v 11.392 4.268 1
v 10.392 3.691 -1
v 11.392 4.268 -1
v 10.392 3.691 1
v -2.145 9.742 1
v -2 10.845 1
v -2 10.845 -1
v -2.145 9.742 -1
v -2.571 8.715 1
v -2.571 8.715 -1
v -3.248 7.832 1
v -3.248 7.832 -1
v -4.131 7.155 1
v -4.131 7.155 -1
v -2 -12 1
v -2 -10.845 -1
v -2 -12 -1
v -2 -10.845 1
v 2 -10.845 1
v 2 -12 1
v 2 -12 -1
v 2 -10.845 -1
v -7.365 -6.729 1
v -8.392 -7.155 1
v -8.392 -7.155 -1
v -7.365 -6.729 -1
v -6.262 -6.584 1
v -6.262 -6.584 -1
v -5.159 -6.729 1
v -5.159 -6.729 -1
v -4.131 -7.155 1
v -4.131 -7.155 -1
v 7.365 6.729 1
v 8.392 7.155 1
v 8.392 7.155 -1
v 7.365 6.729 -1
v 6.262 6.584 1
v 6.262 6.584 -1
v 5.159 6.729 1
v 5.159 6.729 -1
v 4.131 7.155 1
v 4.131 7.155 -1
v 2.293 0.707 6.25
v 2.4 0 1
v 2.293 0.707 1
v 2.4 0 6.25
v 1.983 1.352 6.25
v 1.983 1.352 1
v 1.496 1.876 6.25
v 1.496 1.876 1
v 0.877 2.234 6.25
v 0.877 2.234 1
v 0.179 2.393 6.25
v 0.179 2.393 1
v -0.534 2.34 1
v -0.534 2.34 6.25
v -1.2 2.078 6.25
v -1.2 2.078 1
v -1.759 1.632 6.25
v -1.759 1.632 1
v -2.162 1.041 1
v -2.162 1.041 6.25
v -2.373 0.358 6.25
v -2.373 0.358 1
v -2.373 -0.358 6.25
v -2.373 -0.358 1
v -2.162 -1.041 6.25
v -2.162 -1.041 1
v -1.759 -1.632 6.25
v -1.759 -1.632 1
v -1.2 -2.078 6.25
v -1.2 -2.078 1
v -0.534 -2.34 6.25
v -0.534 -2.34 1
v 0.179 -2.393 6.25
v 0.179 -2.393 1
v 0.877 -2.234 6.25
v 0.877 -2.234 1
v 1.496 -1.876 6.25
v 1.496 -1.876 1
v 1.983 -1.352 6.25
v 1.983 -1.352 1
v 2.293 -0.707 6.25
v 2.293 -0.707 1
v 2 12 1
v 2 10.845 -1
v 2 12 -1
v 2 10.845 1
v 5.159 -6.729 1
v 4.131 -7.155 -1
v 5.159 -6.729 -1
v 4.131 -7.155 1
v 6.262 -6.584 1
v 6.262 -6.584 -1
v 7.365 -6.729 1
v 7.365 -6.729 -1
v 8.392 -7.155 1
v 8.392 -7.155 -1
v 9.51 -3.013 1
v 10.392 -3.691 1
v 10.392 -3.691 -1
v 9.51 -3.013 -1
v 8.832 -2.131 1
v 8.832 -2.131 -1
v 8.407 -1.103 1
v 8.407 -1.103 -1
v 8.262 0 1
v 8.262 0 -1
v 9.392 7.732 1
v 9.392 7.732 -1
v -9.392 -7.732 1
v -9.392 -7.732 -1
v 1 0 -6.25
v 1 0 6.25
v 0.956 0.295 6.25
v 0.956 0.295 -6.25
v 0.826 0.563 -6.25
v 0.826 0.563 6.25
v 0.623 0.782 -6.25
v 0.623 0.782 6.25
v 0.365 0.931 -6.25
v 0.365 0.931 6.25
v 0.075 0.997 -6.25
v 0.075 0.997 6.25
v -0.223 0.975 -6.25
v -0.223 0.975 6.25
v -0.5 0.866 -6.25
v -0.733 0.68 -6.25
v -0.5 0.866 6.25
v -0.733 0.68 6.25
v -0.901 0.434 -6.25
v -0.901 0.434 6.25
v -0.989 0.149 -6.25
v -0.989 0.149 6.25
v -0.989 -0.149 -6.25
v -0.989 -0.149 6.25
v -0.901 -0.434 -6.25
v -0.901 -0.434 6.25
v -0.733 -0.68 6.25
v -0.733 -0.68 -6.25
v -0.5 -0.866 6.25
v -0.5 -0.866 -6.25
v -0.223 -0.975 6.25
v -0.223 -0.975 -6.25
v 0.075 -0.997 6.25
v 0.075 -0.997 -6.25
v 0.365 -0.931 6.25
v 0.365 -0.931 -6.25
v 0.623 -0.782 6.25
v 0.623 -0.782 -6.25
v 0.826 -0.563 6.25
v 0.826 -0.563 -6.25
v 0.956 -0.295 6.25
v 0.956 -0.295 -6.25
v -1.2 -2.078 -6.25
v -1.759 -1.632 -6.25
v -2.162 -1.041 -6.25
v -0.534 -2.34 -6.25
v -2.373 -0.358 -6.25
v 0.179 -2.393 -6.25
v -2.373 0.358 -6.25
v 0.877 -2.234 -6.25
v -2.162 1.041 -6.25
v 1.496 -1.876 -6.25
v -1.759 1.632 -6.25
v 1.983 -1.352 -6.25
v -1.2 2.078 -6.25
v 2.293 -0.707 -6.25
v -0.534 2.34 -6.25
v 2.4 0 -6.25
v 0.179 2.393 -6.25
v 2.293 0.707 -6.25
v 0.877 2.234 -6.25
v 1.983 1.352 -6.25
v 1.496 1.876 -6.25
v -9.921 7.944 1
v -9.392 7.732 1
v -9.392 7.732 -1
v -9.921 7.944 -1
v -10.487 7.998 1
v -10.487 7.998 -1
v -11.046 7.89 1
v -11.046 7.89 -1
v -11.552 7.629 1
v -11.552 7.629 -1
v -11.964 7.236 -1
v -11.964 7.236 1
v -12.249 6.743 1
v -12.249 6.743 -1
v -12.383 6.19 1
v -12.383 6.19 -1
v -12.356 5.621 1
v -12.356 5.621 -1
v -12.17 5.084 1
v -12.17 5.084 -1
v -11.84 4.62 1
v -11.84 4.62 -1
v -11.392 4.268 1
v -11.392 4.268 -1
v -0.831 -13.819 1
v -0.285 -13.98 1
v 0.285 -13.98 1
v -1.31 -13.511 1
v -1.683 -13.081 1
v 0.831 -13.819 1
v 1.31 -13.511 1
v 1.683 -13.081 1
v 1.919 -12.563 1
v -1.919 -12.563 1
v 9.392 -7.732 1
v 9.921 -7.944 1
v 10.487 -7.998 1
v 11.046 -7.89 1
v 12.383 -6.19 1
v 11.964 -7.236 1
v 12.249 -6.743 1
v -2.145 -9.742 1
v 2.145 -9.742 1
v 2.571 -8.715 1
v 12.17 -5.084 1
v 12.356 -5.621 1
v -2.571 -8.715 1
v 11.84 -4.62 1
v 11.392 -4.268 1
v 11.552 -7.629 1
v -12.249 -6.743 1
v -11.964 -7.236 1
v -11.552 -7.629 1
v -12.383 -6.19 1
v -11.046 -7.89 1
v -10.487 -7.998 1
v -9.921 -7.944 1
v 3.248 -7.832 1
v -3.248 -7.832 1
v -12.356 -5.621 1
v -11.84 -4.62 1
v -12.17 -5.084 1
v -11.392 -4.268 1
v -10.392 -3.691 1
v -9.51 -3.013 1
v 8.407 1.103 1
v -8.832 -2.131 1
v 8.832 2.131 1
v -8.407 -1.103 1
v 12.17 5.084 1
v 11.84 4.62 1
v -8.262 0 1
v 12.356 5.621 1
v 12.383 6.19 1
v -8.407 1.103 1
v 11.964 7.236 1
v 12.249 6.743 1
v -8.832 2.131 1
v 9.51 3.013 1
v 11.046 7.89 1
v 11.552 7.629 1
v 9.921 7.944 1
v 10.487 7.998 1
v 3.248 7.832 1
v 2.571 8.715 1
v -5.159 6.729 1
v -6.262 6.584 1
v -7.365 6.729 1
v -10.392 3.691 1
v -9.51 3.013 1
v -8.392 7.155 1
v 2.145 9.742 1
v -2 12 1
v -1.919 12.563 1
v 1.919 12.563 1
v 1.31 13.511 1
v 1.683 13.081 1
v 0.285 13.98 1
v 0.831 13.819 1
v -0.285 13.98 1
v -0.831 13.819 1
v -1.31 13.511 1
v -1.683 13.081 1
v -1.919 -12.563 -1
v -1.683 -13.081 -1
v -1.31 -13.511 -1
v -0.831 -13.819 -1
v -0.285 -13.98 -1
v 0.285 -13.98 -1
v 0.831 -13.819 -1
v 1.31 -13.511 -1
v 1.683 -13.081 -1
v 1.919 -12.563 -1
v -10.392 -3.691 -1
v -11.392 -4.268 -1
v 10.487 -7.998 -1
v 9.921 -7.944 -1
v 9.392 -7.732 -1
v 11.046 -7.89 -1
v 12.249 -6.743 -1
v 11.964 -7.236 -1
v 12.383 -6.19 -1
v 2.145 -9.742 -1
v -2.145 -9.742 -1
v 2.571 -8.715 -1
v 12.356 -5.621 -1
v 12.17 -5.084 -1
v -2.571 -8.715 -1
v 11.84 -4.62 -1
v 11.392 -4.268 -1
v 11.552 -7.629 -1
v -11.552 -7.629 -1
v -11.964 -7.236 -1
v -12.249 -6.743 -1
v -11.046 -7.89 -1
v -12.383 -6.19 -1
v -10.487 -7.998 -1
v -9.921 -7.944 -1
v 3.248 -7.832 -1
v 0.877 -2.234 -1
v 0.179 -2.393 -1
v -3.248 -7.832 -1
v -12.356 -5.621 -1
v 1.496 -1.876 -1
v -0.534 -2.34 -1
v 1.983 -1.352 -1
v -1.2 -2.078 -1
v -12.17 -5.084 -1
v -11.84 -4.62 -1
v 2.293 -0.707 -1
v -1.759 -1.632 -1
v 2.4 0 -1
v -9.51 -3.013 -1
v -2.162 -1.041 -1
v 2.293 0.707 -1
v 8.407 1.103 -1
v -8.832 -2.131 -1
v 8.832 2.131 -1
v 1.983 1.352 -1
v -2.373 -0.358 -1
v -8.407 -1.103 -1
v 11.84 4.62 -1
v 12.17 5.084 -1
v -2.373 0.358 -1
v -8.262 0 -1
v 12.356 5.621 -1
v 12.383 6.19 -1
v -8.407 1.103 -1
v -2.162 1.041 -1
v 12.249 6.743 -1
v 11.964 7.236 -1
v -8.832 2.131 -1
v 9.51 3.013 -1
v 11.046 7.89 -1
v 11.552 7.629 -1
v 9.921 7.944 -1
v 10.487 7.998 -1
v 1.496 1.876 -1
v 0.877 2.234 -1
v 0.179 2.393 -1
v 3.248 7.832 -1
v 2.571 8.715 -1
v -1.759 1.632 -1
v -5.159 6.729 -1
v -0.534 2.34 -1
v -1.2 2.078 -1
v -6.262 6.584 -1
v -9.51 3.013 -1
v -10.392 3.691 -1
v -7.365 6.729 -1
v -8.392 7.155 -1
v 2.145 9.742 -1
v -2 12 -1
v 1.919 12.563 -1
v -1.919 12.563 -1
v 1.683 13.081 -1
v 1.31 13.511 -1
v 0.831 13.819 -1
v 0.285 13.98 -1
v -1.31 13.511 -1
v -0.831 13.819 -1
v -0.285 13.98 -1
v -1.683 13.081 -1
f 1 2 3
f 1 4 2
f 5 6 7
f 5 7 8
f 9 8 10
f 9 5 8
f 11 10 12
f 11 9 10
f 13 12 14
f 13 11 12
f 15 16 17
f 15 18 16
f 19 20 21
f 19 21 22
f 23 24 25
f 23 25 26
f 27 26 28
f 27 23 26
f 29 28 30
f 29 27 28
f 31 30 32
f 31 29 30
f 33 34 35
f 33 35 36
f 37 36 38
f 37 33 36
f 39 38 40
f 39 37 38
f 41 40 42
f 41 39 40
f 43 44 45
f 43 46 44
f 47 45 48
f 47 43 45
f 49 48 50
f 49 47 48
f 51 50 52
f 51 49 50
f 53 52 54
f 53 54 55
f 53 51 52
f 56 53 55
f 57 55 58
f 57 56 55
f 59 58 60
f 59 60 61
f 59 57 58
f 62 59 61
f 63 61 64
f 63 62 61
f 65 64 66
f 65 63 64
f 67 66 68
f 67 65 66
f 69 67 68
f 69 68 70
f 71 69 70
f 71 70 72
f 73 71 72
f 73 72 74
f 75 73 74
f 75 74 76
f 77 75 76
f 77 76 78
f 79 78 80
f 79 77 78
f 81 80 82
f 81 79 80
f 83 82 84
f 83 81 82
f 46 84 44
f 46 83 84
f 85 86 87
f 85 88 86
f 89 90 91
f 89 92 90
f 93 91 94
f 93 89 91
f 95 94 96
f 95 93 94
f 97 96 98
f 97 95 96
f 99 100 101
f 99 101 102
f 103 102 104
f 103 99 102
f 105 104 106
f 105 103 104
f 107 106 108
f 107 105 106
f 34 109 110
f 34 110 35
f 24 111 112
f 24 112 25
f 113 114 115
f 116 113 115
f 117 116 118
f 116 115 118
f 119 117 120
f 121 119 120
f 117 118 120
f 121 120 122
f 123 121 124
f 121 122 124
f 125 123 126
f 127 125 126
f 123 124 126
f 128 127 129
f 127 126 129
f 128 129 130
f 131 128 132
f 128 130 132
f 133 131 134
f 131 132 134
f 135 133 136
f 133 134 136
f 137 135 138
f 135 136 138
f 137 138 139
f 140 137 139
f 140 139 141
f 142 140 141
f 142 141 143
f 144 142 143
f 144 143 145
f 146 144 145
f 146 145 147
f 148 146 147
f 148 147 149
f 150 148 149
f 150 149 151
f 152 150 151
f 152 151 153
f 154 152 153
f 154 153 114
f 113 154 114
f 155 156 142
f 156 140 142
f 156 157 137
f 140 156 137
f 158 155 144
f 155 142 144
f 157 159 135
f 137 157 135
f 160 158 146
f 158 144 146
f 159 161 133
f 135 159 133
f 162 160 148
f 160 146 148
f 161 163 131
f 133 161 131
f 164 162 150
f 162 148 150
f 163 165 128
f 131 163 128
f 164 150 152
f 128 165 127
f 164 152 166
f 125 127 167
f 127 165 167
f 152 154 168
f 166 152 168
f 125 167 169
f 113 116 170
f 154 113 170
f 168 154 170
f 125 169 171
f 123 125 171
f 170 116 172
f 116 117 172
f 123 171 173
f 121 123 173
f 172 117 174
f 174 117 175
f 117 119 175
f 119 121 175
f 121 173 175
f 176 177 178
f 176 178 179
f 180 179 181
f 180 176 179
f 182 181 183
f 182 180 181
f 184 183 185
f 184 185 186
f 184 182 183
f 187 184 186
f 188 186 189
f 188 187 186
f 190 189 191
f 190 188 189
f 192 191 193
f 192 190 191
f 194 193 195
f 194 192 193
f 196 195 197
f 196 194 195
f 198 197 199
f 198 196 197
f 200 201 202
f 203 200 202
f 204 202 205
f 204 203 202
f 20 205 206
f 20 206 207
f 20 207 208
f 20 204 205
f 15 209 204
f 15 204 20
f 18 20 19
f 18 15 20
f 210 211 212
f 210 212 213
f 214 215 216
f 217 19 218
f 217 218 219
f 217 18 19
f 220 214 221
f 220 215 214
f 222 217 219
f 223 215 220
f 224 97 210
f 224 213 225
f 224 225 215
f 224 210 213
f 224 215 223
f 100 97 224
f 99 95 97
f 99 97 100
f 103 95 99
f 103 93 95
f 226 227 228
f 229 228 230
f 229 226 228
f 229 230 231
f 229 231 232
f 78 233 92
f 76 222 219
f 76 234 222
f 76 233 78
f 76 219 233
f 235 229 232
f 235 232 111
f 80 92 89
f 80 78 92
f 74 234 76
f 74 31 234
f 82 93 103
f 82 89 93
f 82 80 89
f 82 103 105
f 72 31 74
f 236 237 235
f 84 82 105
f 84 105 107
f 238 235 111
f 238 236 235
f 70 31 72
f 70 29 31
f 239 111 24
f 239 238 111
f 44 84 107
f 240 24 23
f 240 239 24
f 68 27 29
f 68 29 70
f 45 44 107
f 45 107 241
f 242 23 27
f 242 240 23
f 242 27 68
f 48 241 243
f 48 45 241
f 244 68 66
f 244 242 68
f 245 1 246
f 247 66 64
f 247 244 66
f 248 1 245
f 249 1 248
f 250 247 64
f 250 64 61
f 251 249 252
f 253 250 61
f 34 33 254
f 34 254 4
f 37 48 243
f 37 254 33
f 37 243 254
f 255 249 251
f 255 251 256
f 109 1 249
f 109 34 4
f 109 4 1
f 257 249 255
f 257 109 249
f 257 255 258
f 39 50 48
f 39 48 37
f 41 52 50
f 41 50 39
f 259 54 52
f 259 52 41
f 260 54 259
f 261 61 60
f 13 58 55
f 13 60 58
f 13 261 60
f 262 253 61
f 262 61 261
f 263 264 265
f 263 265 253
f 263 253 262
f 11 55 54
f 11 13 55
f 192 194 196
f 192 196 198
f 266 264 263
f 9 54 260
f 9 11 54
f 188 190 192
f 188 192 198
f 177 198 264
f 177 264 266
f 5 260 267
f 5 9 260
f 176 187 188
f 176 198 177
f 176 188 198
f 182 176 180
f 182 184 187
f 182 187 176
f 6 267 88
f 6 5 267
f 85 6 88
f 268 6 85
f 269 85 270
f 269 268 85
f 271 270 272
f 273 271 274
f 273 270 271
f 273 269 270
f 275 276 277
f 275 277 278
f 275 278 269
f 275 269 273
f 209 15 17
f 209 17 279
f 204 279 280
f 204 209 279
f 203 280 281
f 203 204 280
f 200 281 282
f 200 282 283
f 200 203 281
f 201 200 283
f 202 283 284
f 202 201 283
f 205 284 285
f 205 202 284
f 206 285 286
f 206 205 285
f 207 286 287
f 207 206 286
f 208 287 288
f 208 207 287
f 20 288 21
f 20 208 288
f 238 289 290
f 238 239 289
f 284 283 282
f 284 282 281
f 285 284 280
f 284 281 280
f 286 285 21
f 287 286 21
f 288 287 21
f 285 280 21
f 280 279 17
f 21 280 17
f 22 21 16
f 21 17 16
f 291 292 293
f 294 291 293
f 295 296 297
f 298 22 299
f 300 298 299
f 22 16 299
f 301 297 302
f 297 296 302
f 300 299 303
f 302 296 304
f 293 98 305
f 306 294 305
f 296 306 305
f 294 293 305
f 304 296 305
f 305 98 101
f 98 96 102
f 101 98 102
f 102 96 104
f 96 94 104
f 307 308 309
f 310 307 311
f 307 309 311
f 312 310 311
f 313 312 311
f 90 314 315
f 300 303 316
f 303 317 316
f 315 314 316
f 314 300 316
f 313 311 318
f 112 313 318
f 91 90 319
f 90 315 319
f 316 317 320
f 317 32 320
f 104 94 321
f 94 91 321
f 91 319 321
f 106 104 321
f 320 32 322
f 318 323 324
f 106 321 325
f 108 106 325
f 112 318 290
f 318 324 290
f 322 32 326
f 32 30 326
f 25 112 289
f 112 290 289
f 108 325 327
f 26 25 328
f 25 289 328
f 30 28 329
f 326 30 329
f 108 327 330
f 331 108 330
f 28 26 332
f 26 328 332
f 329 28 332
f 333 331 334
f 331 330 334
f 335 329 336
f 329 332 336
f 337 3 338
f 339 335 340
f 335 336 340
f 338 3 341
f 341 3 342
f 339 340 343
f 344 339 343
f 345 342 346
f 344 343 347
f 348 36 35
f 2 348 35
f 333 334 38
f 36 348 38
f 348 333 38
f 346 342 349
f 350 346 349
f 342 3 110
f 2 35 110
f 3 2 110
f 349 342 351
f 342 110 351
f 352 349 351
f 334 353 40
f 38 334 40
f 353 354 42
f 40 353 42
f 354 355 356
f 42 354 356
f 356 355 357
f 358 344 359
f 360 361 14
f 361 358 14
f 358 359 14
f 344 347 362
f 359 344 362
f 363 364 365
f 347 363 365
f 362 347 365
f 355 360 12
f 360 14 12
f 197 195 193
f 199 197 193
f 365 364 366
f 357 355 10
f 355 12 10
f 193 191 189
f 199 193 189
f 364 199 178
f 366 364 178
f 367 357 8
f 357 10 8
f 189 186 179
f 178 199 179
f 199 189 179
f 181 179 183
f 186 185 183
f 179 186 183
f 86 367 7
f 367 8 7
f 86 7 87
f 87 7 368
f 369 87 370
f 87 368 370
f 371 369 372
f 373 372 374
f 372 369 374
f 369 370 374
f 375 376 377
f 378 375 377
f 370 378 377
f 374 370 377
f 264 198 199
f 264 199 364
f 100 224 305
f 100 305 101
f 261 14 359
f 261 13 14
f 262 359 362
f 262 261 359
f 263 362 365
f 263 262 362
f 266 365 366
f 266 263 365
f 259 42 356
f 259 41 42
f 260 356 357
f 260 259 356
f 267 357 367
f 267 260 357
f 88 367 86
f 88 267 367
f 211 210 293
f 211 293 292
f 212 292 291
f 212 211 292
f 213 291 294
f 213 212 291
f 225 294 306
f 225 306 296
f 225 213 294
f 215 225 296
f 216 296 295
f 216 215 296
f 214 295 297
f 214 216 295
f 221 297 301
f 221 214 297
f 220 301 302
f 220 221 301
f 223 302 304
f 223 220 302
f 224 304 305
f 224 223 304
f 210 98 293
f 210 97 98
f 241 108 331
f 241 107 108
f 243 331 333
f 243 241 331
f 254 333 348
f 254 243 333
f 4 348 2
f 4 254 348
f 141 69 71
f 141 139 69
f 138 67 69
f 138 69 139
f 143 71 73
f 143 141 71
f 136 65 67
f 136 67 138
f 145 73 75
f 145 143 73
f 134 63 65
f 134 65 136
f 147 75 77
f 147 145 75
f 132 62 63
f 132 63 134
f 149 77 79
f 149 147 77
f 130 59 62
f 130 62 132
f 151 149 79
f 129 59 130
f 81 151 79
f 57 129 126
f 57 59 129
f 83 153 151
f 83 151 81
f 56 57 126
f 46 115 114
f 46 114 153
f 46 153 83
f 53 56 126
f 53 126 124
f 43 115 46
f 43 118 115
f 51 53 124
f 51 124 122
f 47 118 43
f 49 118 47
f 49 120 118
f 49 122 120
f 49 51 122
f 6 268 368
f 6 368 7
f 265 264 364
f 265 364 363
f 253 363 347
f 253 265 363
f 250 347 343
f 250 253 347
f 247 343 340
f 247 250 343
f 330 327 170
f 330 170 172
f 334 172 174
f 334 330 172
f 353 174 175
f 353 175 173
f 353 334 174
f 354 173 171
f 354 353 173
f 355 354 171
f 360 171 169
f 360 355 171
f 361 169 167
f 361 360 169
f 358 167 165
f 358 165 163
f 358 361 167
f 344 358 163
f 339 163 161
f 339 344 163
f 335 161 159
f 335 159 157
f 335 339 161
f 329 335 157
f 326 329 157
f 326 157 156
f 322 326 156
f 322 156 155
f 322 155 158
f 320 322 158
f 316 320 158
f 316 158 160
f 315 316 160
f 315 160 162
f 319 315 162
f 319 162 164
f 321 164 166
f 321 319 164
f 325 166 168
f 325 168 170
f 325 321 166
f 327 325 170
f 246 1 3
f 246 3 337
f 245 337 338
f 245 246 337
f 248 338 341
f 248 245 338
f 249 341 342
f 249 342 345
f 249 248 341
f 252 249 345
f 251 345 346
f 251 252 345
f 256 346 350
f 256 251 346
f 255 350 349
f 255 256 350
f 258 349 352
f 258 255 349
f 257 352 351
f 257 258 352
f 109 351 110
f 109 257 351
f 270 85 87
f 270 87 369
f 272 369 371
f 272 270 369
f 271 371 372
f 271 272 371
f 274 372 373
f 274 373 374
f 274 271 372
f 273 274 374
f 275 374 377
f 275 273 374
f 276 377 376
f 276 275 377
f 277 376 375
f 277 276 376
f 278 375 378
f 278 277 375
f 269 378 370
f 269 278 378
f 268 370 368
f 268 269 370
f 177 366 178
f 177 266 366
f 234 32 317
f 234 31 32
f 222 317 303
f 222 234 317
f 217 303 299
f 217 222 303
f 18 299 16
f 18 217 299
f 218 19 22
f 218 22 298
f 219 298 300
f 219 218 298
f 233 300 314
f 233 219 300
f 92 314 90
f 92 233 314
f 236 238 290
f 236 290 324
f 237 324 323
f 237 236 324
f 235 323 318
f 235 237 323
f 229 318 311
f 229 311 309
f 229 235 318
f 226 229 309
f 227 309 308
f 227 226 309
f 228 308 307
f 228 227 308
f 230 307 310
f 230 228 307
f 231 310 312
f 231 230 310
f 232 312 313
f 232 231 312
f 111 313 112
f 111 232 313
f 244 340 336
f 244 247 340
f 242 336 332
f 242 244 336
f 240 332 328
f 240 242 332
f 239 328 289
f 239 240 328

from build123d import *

# Parameters (mm, degrees)
F1_DEPTH = 1
F2_COUNT = 6
F3_R     = 2.4
F4_DEPTH = 6.25
F5_R     = 1
F6_DEPTH = 12.501


with BuildPart() as f1:
    # F0 (on Top) → F1 (new body, symmetric)
    with BuildSketch(Plane.XY):
        with BuildLine():
            Line((2, 10.8452994616), (2, 12))
            ThreePointArc((2, 12), (0, 14), (-2, 12))
            Line((-2, 12), (-2, 10.8452994616))
            ThreePointArc((-2, 10.8452994616), (-2.5709376404, 8.7145311798), (-4.1307682818, 7.1547005384))
            Line((-4.1307682818, 7.1547005384), (0, 0))
            Line((0, 0), (4.1307682818, 7.1547005384))
            ThreePointArc((4.1307682818, 7.1547005384), (2.5709376404, 8.7145311798), (2, 10.8452994616))
        make_face()
    extrude(amount=F1_DEPTH, both=True)

    # F2: F1 ×6 about axis
    f2_axis = Axis((0, 0, 0), (0, 0, -1))


with BuildPart() as f1_1:
    add(f1.part)
    for i in range(1, F2_COUNT):
        add(f1.part.rotate(f2_axis, i * 360 / F2_COUNT))

    # F3 (on Top) → F4 (join, symmetric)
    with BuildSketch(Plane.XY):
        Circle(F3_R)
    extrude(amount=F4_DEPTH, both=True)

    # F5 (on face) → F6 (cut, through all)
    with BuildSketch(Plane.XY.offset(6.25)):
        Circle(F5_R)
    extrude(amount=-F6_DEPTH, mode=Mode.SUBTRACT)


solid = f1_1.part
